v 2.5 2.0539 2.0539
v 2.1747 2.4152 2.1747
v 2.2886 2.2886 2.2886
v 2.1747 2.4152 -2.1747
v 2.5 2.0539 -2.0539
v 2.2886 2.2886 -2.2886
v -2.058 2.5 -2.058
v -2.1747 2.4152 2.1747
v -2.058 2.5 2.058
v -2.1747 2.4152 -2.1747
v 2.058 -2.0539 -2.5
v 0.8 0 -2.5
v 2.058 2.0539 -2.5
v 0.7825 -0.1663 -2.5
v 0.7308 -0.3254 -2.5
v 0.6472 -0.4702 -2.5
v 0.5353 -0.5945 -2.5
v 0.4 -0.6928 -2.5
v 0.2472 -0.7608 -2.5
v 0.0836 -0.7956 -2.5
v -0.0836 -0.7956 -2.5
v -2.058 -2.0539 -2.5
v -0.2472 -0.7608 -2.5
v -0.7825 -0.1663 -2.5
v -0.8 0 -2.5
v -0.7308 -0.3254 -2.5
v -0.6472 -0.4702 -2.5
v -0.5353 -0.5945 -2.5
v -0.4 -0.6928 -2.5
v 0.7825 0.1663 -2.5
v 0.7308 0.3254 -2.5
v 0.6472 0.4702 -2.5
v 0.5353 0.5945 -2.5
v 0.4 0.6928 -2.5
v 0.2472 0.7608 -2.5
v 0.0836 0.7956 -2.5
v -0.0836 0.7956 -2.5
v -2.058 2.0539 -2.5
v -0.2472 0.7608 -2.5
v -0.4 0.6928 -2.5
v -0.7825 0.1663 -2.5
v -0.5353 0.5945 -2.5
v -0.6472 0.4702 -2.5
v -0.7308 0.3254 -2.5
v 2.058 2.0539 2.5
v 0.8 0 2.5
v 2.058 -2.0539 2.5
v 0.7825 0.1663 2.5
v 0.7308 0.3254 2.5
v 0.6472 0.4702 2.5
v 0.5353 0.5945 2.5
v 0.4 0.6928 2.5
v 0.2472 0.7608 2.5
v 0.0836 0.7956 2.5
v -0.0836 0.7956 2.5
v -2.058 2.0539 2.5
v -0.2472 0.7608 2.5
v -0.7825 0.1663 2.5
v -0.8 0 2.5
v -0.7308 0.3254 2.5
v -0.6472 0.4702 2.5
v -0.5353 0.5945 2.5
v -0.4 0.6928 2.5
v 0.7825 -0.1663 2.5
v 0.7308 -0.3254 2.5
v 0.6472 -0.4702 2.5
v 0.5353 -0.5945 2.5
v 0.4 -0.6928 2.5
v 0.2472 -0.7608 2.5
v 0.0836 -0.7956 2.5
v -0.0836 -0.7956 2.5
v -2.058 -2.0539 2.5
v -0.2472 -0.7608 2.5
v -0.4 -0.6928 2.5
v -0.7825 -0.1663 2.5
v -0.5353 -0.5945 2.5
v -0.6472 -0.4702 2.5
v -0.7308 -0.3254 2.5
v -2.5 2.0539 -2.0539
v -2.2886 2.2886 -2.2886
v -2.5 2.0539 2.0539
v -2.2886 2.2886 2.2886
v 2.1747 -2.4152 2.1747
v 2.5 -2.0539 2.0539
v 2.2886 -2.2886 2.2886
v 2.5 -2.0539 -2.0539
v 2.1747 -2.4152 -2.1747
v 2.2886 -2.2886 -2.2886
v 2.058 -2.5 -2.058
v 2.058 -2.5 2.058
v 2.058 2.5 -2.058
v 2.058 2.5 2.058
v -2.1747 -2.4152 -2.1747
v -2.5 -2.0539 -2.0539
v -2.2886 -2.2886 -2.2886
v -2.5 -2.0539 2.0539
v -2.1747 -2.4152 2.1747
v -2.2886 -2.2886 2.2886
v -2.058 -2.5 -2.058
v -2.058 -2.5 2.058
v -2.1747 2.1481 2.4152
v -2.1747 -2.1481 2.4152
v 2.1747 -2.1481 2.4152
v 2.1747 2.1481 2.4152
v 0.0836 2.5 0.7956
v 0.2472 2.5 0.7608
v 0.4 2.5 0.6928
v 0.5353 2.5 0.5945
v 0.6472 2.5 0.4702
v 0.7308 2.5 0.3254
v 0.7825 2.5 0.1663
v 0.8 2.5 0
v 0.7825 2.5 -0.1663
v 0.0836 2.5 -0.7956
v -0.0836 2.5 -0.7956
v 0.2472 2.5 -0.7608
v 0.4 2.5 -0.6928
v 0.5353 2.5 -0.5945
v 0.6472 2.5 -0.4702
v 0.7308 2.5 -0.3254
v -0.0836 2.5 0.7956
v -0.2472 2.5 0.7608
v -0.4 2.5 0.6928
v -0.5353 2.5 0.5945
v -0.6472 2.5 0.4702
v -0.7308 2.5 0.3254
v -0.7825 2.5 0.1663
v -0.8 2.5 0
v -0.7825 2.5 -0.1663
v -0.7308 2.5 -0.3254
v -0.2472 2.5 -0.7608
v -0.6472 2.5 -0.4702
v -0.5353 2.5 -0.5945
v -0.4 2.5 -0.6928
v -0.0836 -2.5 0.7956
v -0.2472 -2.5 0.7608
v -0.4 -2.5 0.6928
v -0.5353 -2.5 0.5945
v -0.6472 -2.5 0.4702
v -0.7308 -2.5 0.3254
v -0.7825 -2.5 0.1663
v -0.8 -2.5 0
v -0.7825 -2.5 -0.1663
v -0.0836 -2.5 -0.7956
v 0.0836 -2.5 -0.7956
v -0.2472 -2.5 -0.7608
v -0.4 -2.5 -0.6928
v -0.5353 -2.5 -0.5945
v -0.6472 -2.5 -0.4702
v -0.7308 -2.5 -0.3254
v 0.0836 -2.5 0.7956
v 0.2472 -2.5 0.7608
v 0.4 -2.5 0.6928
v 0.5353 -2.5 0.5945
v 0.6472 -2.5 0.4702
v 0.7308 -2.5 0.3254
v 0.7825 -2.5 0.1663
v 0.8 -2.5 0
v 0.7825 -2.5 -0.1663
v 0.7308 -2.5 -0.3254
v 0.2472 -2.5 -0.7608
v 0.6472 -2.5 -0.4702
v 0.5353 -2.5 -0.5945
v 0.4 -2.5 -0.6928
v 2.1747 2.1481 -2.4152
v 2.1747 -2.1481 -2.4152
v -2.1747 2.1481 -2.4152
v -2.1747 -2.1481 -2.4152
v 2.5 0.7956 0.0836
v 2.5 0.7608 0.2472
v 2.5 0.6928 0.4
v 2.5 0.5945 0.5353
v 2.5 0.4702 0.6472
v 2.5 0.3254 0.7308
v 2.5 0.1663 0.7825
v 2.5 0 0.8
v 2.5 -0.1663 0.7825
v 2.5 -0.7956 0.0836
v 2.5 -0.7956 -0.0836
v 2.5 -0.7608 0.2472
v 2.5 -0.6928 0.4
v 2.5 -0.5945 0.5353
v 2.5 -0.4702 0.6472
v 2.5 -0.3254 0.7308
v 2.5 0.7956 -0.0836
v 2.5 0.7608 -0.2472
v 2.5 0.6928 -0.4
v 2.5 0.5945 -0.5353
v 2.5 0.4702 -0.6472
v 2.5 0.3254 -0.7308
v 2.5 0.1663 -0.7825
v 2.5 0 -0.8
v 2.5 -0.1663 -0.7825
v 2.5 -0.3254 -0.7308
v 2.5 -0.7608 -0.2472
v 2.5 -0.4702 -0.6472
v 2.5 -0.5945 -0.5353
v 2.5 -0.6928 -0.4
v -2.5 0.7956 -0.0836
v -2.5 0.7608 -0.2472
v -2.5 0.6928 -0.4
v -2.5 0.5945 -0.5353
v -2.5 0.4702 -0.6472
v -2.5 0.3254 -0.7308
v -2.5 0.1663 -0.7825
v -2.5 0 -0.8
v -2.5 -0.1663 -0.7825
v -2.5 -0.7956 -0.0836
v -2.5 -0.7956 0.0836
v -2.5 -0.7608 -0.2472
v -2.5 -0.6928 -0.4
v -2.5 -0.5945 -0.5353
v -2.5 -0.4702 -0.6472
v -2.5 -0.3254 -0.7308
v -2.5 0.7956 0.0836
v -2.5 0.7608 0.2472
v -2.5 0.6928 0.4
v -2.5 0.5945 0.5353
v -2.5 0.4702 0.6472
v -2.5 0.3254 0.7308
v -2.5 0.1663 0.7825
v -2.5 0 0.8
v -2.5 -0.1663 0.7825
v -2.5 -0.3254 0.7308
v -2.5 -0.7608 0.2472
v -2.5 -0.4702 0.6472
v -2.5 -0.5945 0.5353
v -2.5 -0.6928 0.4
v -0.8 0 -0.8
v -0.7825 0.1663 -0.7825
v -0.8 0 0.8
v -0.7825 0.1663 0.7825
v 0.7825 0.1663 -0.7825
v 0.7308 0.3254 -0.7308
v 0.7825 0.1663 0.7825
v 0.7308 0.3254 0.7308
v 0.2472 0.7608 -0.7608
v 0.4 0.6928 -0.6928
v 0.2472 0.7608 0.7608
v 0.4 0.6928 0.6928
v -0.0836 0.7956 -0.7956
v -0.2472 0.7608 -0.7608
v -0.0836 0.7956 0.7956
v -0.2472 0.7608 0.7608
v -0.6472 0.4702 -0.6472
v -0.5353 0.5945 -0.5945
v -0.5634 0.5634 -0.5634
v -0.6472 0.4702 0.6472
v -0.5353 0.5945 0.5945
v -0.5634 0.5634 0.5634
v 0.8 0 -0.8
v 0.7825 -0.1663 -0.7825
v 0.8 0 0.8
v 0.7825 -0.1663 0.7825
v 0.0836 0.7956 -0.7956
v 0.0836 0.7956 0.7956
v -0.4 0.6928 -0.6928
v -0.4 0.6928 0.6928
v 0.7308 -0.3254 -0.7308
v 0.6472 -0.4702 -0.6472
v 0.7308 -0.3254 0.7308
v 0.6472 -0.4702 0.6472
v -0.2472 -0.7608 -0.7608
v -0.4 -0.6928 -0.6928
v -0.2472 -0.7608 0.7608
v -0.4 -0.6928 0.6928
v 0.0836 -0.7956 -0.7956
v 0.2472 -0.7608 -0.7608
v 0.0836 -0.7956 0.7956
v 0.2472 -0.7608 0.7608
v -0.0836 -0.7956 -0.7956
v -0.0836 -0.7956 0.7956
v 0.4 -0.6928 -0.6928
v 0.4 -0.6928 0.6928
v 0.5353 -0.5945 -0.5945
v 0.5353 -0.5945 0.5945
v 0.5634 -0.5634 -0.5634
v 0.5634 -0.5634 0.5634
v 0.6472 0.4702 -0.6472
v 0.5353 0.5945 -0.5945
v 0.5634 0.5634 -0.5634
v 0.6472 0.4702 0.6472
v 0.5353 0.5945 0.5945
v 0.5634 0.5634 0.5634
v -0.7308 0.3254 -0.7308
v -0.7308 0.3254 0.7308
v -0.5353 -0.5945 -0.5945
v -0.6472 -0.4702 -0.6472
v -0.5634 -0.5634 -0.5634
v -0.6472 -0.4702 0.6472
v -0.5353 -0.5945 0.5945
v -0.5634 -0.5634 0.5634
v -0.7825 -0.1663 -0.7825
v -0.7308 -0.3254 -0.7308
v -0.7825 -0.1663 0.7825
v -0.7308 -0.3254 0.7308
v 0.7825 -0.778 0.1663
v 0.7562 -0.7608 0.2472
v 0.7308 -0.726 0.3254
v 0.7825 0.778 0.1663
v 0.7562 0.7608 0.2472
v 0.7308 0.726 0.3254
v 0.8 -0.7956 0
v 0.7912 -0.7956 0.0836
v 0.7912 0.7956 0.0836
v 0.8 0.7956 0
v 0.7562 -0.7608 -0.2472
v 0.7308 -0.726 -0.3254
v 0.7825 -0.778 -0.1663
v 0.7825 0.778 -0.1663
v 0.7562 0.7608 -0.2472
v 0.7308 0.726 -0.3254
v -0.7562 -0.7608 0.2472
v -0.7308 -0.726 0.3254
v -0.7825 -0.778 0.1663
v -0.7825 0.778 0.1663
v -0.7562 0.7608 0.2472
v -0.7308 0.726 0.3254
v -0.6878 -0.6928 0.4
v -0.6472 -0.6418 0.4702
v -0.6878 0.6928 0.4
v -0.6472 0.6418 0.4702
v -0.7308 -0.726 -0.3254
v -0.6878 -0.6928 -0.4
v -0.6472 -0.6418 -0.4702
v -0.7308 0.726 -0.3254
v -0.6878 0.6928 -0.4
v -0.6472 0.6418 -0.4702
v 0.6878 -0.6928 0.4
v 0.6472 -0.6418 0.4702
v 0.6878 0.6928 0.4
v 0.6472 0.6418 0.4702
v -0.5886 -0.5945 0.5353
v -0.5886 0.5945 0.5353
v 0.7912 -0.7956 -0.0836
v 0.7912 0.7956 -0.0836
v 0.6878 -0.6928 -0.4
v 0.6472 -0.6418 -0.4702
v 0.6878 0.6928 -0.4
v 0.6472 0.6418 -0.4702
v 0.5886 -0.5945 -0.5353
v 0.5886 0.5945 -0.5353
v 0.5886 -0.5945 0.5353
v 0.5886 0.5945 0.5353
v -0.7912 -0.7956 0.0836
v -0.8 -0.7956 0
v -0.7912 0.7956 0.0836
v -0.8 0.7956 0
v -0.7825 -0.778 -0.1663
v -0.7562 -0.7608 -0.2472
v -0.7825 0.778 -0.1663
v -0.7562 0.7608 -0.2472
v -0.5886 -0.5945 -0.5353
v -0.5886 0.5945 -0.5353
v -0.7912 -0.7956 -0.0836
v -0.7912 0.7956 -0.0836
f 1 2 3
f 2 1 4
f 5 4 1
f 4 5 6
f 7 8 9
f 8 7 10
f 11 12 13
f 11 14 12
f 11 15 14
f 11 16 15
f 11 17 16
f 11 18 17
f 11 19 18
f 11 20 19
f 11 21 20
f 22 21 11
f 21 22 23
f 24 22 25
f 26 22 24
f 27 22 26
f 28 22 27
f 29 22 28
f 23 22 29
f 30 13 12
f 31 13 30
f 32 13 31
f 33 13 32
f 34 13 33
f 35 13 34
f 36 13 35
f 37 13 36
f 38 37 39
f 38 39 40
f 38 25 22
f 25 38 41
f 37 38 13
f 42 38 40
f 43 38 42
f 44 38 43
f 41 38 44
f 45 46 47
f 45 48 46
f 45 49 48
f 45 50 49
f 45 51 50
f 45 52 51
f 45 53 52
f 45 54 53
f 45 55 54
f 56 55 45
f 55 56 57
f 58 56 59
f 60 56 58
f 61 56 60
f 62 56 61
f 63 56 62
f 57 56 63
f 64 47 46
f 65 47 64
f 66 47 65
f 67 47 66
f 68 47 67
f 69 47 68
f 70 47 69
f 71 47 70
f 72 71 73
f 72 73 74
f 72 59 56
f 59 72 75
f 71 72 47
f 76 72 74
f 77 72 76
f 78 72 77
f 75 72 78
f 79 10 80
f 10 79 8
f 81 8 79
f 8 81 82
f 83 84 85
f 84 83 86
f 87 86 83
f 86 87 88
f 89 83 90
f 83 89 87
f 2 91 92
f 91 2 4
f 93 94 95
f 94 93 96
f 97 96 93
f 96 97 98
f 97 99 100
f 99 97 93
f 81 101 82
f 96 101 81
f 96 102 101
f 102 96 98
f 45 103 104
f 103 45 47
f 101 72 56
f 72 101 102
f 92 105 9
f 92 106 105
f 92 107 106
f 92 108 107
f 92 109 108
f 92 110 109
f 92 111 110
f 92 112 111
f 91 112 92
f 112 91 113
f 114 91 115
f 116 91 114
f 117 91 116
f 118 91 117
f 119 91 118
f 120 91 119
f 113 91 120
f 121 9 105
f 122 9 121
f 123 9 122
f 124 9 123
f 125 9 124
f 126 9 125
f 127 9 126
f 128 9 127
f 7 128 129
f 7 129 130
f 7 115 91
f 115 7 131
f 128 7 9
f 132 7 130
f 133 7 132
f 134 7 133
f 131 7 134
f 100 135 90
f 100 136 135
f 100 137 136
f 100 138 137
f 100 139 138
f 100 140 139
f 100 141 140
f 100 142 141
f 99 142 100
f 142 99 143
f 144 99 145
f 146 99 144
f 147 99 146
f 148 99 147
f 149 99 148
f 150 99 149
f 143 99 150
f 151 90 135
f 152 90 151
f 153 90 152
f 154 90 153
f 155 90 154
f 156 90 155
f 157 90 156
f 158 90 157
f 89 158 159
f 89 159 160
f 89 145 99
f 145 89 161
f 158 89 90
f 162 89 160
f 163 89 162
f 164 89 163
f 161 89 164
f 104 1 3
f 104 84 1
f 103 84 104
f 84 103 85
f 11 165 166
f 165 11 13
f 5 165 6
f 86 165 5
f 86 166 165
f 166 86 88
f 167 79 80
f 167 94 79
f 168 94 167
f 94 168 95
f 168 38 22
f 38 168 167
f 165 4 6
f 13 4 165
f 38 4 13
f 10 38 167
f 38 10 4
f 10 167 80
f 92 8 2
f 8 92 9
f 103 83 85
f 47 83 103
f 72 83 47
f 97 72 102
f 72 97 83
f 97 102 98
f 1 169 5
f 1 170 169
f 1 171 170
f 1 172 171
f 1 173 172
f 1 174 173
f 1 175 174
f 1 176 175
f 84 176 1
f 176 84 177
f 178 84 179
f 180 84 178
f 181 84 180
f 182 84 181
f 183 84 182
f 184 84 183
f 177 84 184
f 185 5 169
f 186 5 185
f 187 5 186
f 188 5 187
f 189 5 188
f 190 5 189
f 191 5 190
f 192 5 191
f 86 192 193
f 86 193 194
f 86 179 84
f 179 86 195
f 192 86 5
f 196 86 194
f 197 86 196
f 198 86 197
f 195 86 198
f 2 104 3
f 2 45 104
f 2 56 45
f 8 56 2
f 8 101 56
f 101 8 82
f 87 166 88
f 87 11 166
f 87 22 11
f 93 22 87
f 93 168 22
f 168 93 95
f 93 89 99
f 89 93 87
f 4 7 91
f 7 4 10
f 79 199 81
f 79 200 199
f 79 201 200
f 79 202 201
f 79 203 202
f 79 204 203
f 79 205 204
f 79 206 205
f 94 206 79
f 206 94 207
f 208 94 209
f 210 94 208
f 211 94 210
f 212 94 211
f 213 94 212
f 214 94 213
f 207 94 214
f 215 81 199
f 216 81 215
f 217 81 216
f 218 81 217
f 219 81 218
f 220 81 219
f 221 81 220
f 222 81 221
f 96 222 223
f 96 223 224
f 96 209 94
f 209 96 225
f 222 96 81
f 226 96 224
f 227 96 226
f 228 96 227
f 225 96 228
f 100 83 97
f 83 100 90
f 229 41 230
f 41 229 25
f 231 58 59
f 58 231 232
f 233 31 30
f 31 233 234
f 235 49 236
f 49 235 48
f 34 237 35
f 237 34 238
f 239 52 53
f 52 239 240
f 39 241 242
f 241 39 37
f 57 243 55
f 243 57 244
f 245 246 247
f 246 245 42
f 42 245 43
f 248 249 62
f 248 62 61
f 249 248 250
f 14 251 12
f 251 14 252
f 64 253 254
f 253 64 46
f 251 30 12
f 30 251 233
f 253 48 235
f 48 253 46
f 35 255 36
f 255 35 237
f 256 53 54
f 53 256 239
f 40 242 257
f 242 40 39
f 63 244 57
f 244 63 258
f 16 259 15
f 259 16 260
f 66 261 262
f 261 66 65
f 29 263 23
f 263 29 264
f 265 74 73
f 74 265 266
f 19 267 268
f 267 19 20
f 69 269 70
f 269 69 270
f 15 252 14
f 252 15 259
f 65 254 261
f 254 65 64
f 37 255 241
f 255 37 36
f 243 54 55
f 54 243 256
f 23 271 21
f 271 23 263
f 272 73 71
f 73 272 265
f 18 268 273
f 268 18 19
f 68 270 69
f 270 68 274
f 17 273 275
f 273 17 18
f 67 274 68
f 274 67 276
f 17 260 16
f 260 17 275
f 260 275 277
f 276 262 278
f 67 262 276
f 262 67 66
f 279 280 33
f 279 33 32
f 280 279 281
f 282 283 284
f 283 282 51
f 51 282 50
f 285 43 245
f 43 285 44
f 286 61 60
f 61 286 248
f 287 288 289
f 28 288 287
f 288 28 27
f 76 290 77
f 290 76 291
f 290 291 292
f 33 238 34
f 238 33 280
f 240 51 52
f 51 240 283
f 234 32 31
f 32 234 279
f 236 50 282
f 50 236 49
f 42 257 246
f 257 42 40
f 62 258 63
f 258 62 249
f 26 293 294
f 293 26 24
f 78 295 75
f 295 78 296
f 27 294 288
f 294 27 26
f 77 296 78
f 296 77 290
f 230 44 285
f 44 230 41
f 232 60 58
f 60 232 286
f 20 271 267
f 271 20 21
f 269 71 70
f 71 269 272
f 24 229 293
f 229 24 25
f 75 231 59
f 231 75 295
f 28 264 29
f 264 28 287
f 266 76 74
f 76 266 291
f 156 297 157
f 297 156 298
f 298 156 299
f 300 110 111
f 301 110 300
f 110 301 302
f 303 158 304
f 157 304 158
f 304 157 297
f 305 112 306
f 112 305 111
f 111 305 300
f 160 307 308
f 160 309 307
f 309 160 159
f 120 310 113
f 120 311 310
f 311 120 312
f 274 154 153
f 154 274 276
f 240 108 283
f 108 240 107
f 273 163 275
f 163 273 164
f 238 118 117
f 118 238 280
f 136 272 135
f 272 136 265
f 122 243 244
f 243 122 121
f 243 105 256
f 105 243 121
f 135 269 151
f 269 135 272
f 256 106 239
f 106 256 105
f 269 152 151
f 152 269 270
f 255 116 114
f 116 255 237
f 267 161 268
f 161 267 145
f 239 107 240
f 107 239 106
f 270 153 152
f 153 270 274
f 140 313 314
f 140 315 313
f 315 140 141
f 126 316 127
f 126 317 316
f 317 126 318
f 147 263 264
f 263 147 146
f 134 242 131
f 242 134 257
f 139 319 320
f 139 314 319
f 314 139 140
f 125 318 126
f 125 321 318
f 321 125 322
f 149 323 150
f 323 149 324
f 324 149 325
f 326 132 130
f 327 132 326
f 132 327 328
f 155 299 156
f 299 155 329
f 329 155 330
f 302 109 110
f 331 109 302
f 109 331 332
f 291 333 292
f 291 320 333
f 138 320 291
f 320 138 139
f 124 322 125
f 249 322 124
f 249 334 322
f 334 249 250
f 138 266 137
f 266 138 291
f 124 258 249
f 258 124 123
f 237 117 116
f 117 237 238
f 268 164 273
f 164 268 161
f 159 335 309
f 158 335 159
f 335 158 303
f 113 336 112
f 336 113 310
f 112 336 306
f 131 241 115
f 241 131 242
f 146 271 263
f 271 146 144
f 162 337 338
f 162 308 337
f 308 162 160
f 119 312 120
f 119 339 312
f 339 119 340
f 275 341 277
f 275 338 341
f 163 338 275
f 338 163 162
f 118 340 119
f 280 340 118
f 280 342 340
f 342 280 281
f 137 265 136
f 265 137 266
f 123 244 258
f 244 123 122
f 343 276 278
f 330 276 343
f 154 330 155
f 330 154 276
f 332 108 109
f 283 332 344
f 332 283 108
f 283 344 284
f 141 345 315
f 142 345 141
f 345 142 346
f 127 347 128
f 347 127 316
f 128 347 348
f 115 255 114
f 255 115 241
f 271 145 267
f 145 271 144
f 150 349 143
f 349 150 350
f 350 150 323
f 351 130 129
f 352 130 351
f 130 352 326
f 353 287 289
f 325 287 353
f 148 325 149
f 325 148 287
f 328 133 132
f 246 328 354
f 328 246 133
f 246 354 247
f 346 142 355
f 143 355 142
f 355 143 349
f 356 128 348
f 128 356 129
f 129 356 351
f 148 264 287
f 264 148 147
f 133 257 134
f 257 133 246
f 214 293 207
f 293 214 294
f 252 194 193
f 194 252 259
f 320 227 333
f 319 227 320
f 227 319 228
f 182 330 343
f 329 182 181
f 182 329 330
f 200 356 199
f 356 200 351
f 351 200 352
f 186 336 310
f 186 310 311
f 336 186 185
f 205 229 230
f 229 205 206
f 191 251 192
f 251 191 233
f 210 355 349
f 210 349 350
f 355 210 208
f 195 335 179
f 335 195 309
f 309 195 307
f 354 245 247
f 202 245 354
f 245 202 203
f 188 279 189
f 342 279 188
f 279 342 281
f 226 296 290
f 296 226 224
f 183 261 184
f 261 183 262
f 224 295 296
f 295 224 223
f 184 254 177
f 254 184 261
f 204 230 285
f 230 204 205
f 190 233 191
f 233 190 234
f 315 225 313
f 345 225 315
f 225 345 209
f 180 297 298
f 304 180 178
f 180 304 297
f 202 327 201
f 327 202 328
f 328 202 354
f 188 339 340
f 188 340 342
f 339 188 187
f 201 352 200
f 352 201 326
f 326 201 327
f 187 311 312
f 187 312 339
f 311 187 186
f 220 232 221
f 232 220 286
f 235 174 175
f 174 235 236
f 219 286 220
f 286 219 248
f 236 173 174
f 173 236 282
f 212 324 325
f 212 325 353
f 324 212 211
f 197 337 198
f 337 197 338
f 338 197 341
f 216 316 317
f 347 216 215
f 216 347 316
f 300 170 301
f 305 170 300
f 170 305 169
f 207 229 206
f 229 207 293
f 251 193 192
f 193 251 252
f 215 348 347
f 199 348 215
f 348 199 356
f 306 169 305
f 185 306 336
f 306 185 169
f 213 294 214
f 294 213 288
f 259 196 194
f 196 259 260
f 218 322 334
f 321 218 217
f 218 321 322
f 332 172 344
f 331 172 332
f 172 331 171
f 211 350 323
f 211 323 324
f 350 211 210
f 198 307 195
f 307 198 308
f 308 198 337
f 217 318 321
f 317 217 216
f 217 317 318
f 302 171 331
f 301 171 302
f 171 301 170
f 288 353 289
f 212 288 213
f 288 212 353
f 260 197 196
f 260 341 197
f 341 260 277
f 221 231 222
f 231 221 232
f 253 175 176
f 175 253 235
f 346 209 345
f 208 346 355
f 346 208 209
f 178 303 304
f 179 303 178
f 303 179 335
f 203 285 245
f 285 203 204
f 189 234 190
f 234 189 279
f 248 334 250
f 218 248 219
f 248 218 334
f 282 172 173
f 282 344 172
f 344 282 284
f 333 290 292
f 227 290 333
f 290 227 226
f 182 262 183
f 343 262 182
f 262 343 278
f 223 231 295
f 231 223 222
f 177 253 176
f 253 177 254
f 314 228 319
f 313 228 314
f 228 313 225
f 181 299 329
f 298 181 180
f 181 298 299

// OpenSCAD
$fn =30;
base =5;
module peghole(){
    color("Blue")cylinder (6, .8, .8, true);
}
// the peg hole template, a change in size here changes hole everywhere
module peg(){
    cylinder (2, .8, .8);
}

module edge(){
cylinder (base, 3.25, 3.25, true);
}
// a cylinder for making block


module block(){
    intersection(){
edge();
rotate([90,0,0]) edge();
rotate([0, 90, 0]) edge();
}
}
// create the base cube without the holes


module blox(){
difference(){ 
block();
   peghole();
rotate ([90, 0, 0]) peghole();
rotate ([0, 90, 0]) peghole();
}
}
blox();
//unembeleshed blox cube
module corner(){difference(){
    block();
   translate([-3,-3,3])rotate([0,45,0])
cube([8,6
   ,4]) color("Red");
 rotate([0,90,0])
   translate([0,0,-4]) peghole();
 translate([0,0,-4]) peghole();   
 rotate([0,45,0]) translate([0,0,1])peghole();   
}
}
    
//anled blox piece

module side(){
    blox();
    translate([0,0,base])corner();
translate([0,0,-base]) rotate([0,90,0]) corner();
}
// Pentagram side of octagon, can be own piece

module 3long() {
    blox();
    translate([0,0,base]) blox();
    translate([0,0,-base]) blox();
}
module oct() {
3long();
translate([5,0,0]) side();
translate([-5,0,0]) rotate([0,180,0]) side();
}
// one octagon of blox, can be used as own piece

module longside() {
side();
translate([0,base,0]) side();
translate([0,-base,0]) side();
}
// long side can be used as own piece

module hexlong(){
longside();
translate([-base,0,0]) rotate([0,180,0]) longside();
}
// long side in the combined form, usable as piece

module 3X3() {
3long();
translate([0,base,0]) 3long();
translate([0,-base,0]) 3long();
}
// plate of 3X3 blox can be used as own piece

module long(){
    oct();
translate([0,base,0]) oct();
translate([0,-base,0]) oct();
}
// octoganal tube with solid fill

module longhollow(){
difference(){
long();
cube([10,10,base], true);
cube([base,10,10], true);
}
}
// lighter octoganal tube

module test(){
translate([0,0,10]) blox();
rotate([0,45,0]) translate([0,0,9.5]) blox();
}
// set up angle for bracket design
module core() {
    color("Red") translate([0,0,2.5]) blox();
    color("Red");
}
// a test blox to position in cap
module caplower(){
CapPoints = [ [0,1.5*base,0],[base,.5*base,0],[base,-.5*base,0],[0,-1.5*base,0],[0,2.35,4.6],[2.35,2.35,4.6],[2.35,-2.35,4.6],[0,-2.35,4.6] ];
CapFaces = [ [0,1,2,3],[1,0,5],[3,2,6],[3,6,7],[3,7,4,0],[2,1,5,6],[5,4,7,6],[4,5,0] ];
polyhedron(CapPoints, CapFaces,convexity = 1);
}
// creates a cap with a petruding blox, needs finetuning
module thirdoctcap() {
    CapPoints = [ [0,1.5*base,0],[base,.5*base,0],[base,-.5*base,0],[0,-1.5*base,0],[0,.5*base,base],[0,-.5*base,base] ];
CapFaces = [ [3,2,1,0],[4,0,1],[5,2,3],,[0,4,5,3],[5,4,1,2]];
difference(){
    polyhedron(CapPoints, CapFaces,convexity = 1);
translate([.5*base,0,-1.5]) peghole();
}
}
//side();
//thirdoctcap();
//translate([-5,0,0]) rotate([0,0,180]) thirdoctcap();
module halfflatcap() {
    CapPoints = [ [0,1.5*base,0],[base,.5*base,0],[base,-.5*base,0],[0,-1.5*base,0],[0,.5*base,base],[.5*base,.5*base,base],[2.5,-.5*base,base],[0,-2.5,base] ];
CapFaces = [ [3,2,1,0],[5,0,1],[6,2,3],[7,6,3],[0,4,7,3],[6,5,1,2],[6,7,4,5],[0,5,4] ];
difference(){
    polyhedron(CapPoints, CapFaces,convexity = 1);
translate([.5*base,0,-1]) peghole();
translate([0,0,4]) peghole();
}
}
// make half a cao for hex with sides flush with top of blox
module fulflatcap() {
    halfflatcap();
rotate ([0,0,180]) halfflatcap();
}
// make cap for hex with sides flush with top of blox
//difference(){
module wingspots(){
    rotate([0,-90,0]) side();
translate([0,0,-base])
union(){
   test();
rotate([0,0,180]) test();
}
}
// test of wing spots,
//why does diference with core not work

module test2() {
difference(){
    wingspots();
translate([0,0,base
   ]) cube(5.005
   ,true);
    //messing with a hairs breadth as blox() ads a tiny hight change
}
//blox();
}
// test for bracket between octagon angles
module bracketendb(){
cylinder(1,1.25,1.25);
translate([0,-1.25,0]) cube([2,2.5,1]);
    peg();
}
module bracketpegs() {
    translate([-4.5,0,2]) rotate ([180,45,0]) bracketendb();
translate([4.5,0,2]) rotate ([0,135,0]) bracketendb();
translate([0,0,.5]) cube([7,2.5,1], true);
translate([0,0,-2]) peg();
}
module acutebracket() { 
     translate([-1,,-1.25,-2])rotate([0,45,0]) cube([1,2.5,1]);
    rotate([0,90,180]) bracketendb();
translate([.75,0,-.75]) rotate([0,135,0])  bracketendb();
}
//bracket for flat to angled wings
module hexwings() {
    translate([0,0,2.5]) wingspots();
rotate([0,180,0]) translate([0,0,2.5]) wingspots();
}
//test rig for hexbody wing placement
module smallrightbrace() {
    translate([-1.7,0,1.7]) rotate([0,135,180]) bracketendb();
translate([1.7,0,1.7])rotate([180,45,180]) bracketendb();
translate([0,0,.3]) cube([2,2.5,1], true);
}
// bracket for angled wings on hex body
//some trimming could be done

//translate([-.5*base,-1.5*base,0]) rotate([90,0,0]) fulflatcap();
//hexlong();
